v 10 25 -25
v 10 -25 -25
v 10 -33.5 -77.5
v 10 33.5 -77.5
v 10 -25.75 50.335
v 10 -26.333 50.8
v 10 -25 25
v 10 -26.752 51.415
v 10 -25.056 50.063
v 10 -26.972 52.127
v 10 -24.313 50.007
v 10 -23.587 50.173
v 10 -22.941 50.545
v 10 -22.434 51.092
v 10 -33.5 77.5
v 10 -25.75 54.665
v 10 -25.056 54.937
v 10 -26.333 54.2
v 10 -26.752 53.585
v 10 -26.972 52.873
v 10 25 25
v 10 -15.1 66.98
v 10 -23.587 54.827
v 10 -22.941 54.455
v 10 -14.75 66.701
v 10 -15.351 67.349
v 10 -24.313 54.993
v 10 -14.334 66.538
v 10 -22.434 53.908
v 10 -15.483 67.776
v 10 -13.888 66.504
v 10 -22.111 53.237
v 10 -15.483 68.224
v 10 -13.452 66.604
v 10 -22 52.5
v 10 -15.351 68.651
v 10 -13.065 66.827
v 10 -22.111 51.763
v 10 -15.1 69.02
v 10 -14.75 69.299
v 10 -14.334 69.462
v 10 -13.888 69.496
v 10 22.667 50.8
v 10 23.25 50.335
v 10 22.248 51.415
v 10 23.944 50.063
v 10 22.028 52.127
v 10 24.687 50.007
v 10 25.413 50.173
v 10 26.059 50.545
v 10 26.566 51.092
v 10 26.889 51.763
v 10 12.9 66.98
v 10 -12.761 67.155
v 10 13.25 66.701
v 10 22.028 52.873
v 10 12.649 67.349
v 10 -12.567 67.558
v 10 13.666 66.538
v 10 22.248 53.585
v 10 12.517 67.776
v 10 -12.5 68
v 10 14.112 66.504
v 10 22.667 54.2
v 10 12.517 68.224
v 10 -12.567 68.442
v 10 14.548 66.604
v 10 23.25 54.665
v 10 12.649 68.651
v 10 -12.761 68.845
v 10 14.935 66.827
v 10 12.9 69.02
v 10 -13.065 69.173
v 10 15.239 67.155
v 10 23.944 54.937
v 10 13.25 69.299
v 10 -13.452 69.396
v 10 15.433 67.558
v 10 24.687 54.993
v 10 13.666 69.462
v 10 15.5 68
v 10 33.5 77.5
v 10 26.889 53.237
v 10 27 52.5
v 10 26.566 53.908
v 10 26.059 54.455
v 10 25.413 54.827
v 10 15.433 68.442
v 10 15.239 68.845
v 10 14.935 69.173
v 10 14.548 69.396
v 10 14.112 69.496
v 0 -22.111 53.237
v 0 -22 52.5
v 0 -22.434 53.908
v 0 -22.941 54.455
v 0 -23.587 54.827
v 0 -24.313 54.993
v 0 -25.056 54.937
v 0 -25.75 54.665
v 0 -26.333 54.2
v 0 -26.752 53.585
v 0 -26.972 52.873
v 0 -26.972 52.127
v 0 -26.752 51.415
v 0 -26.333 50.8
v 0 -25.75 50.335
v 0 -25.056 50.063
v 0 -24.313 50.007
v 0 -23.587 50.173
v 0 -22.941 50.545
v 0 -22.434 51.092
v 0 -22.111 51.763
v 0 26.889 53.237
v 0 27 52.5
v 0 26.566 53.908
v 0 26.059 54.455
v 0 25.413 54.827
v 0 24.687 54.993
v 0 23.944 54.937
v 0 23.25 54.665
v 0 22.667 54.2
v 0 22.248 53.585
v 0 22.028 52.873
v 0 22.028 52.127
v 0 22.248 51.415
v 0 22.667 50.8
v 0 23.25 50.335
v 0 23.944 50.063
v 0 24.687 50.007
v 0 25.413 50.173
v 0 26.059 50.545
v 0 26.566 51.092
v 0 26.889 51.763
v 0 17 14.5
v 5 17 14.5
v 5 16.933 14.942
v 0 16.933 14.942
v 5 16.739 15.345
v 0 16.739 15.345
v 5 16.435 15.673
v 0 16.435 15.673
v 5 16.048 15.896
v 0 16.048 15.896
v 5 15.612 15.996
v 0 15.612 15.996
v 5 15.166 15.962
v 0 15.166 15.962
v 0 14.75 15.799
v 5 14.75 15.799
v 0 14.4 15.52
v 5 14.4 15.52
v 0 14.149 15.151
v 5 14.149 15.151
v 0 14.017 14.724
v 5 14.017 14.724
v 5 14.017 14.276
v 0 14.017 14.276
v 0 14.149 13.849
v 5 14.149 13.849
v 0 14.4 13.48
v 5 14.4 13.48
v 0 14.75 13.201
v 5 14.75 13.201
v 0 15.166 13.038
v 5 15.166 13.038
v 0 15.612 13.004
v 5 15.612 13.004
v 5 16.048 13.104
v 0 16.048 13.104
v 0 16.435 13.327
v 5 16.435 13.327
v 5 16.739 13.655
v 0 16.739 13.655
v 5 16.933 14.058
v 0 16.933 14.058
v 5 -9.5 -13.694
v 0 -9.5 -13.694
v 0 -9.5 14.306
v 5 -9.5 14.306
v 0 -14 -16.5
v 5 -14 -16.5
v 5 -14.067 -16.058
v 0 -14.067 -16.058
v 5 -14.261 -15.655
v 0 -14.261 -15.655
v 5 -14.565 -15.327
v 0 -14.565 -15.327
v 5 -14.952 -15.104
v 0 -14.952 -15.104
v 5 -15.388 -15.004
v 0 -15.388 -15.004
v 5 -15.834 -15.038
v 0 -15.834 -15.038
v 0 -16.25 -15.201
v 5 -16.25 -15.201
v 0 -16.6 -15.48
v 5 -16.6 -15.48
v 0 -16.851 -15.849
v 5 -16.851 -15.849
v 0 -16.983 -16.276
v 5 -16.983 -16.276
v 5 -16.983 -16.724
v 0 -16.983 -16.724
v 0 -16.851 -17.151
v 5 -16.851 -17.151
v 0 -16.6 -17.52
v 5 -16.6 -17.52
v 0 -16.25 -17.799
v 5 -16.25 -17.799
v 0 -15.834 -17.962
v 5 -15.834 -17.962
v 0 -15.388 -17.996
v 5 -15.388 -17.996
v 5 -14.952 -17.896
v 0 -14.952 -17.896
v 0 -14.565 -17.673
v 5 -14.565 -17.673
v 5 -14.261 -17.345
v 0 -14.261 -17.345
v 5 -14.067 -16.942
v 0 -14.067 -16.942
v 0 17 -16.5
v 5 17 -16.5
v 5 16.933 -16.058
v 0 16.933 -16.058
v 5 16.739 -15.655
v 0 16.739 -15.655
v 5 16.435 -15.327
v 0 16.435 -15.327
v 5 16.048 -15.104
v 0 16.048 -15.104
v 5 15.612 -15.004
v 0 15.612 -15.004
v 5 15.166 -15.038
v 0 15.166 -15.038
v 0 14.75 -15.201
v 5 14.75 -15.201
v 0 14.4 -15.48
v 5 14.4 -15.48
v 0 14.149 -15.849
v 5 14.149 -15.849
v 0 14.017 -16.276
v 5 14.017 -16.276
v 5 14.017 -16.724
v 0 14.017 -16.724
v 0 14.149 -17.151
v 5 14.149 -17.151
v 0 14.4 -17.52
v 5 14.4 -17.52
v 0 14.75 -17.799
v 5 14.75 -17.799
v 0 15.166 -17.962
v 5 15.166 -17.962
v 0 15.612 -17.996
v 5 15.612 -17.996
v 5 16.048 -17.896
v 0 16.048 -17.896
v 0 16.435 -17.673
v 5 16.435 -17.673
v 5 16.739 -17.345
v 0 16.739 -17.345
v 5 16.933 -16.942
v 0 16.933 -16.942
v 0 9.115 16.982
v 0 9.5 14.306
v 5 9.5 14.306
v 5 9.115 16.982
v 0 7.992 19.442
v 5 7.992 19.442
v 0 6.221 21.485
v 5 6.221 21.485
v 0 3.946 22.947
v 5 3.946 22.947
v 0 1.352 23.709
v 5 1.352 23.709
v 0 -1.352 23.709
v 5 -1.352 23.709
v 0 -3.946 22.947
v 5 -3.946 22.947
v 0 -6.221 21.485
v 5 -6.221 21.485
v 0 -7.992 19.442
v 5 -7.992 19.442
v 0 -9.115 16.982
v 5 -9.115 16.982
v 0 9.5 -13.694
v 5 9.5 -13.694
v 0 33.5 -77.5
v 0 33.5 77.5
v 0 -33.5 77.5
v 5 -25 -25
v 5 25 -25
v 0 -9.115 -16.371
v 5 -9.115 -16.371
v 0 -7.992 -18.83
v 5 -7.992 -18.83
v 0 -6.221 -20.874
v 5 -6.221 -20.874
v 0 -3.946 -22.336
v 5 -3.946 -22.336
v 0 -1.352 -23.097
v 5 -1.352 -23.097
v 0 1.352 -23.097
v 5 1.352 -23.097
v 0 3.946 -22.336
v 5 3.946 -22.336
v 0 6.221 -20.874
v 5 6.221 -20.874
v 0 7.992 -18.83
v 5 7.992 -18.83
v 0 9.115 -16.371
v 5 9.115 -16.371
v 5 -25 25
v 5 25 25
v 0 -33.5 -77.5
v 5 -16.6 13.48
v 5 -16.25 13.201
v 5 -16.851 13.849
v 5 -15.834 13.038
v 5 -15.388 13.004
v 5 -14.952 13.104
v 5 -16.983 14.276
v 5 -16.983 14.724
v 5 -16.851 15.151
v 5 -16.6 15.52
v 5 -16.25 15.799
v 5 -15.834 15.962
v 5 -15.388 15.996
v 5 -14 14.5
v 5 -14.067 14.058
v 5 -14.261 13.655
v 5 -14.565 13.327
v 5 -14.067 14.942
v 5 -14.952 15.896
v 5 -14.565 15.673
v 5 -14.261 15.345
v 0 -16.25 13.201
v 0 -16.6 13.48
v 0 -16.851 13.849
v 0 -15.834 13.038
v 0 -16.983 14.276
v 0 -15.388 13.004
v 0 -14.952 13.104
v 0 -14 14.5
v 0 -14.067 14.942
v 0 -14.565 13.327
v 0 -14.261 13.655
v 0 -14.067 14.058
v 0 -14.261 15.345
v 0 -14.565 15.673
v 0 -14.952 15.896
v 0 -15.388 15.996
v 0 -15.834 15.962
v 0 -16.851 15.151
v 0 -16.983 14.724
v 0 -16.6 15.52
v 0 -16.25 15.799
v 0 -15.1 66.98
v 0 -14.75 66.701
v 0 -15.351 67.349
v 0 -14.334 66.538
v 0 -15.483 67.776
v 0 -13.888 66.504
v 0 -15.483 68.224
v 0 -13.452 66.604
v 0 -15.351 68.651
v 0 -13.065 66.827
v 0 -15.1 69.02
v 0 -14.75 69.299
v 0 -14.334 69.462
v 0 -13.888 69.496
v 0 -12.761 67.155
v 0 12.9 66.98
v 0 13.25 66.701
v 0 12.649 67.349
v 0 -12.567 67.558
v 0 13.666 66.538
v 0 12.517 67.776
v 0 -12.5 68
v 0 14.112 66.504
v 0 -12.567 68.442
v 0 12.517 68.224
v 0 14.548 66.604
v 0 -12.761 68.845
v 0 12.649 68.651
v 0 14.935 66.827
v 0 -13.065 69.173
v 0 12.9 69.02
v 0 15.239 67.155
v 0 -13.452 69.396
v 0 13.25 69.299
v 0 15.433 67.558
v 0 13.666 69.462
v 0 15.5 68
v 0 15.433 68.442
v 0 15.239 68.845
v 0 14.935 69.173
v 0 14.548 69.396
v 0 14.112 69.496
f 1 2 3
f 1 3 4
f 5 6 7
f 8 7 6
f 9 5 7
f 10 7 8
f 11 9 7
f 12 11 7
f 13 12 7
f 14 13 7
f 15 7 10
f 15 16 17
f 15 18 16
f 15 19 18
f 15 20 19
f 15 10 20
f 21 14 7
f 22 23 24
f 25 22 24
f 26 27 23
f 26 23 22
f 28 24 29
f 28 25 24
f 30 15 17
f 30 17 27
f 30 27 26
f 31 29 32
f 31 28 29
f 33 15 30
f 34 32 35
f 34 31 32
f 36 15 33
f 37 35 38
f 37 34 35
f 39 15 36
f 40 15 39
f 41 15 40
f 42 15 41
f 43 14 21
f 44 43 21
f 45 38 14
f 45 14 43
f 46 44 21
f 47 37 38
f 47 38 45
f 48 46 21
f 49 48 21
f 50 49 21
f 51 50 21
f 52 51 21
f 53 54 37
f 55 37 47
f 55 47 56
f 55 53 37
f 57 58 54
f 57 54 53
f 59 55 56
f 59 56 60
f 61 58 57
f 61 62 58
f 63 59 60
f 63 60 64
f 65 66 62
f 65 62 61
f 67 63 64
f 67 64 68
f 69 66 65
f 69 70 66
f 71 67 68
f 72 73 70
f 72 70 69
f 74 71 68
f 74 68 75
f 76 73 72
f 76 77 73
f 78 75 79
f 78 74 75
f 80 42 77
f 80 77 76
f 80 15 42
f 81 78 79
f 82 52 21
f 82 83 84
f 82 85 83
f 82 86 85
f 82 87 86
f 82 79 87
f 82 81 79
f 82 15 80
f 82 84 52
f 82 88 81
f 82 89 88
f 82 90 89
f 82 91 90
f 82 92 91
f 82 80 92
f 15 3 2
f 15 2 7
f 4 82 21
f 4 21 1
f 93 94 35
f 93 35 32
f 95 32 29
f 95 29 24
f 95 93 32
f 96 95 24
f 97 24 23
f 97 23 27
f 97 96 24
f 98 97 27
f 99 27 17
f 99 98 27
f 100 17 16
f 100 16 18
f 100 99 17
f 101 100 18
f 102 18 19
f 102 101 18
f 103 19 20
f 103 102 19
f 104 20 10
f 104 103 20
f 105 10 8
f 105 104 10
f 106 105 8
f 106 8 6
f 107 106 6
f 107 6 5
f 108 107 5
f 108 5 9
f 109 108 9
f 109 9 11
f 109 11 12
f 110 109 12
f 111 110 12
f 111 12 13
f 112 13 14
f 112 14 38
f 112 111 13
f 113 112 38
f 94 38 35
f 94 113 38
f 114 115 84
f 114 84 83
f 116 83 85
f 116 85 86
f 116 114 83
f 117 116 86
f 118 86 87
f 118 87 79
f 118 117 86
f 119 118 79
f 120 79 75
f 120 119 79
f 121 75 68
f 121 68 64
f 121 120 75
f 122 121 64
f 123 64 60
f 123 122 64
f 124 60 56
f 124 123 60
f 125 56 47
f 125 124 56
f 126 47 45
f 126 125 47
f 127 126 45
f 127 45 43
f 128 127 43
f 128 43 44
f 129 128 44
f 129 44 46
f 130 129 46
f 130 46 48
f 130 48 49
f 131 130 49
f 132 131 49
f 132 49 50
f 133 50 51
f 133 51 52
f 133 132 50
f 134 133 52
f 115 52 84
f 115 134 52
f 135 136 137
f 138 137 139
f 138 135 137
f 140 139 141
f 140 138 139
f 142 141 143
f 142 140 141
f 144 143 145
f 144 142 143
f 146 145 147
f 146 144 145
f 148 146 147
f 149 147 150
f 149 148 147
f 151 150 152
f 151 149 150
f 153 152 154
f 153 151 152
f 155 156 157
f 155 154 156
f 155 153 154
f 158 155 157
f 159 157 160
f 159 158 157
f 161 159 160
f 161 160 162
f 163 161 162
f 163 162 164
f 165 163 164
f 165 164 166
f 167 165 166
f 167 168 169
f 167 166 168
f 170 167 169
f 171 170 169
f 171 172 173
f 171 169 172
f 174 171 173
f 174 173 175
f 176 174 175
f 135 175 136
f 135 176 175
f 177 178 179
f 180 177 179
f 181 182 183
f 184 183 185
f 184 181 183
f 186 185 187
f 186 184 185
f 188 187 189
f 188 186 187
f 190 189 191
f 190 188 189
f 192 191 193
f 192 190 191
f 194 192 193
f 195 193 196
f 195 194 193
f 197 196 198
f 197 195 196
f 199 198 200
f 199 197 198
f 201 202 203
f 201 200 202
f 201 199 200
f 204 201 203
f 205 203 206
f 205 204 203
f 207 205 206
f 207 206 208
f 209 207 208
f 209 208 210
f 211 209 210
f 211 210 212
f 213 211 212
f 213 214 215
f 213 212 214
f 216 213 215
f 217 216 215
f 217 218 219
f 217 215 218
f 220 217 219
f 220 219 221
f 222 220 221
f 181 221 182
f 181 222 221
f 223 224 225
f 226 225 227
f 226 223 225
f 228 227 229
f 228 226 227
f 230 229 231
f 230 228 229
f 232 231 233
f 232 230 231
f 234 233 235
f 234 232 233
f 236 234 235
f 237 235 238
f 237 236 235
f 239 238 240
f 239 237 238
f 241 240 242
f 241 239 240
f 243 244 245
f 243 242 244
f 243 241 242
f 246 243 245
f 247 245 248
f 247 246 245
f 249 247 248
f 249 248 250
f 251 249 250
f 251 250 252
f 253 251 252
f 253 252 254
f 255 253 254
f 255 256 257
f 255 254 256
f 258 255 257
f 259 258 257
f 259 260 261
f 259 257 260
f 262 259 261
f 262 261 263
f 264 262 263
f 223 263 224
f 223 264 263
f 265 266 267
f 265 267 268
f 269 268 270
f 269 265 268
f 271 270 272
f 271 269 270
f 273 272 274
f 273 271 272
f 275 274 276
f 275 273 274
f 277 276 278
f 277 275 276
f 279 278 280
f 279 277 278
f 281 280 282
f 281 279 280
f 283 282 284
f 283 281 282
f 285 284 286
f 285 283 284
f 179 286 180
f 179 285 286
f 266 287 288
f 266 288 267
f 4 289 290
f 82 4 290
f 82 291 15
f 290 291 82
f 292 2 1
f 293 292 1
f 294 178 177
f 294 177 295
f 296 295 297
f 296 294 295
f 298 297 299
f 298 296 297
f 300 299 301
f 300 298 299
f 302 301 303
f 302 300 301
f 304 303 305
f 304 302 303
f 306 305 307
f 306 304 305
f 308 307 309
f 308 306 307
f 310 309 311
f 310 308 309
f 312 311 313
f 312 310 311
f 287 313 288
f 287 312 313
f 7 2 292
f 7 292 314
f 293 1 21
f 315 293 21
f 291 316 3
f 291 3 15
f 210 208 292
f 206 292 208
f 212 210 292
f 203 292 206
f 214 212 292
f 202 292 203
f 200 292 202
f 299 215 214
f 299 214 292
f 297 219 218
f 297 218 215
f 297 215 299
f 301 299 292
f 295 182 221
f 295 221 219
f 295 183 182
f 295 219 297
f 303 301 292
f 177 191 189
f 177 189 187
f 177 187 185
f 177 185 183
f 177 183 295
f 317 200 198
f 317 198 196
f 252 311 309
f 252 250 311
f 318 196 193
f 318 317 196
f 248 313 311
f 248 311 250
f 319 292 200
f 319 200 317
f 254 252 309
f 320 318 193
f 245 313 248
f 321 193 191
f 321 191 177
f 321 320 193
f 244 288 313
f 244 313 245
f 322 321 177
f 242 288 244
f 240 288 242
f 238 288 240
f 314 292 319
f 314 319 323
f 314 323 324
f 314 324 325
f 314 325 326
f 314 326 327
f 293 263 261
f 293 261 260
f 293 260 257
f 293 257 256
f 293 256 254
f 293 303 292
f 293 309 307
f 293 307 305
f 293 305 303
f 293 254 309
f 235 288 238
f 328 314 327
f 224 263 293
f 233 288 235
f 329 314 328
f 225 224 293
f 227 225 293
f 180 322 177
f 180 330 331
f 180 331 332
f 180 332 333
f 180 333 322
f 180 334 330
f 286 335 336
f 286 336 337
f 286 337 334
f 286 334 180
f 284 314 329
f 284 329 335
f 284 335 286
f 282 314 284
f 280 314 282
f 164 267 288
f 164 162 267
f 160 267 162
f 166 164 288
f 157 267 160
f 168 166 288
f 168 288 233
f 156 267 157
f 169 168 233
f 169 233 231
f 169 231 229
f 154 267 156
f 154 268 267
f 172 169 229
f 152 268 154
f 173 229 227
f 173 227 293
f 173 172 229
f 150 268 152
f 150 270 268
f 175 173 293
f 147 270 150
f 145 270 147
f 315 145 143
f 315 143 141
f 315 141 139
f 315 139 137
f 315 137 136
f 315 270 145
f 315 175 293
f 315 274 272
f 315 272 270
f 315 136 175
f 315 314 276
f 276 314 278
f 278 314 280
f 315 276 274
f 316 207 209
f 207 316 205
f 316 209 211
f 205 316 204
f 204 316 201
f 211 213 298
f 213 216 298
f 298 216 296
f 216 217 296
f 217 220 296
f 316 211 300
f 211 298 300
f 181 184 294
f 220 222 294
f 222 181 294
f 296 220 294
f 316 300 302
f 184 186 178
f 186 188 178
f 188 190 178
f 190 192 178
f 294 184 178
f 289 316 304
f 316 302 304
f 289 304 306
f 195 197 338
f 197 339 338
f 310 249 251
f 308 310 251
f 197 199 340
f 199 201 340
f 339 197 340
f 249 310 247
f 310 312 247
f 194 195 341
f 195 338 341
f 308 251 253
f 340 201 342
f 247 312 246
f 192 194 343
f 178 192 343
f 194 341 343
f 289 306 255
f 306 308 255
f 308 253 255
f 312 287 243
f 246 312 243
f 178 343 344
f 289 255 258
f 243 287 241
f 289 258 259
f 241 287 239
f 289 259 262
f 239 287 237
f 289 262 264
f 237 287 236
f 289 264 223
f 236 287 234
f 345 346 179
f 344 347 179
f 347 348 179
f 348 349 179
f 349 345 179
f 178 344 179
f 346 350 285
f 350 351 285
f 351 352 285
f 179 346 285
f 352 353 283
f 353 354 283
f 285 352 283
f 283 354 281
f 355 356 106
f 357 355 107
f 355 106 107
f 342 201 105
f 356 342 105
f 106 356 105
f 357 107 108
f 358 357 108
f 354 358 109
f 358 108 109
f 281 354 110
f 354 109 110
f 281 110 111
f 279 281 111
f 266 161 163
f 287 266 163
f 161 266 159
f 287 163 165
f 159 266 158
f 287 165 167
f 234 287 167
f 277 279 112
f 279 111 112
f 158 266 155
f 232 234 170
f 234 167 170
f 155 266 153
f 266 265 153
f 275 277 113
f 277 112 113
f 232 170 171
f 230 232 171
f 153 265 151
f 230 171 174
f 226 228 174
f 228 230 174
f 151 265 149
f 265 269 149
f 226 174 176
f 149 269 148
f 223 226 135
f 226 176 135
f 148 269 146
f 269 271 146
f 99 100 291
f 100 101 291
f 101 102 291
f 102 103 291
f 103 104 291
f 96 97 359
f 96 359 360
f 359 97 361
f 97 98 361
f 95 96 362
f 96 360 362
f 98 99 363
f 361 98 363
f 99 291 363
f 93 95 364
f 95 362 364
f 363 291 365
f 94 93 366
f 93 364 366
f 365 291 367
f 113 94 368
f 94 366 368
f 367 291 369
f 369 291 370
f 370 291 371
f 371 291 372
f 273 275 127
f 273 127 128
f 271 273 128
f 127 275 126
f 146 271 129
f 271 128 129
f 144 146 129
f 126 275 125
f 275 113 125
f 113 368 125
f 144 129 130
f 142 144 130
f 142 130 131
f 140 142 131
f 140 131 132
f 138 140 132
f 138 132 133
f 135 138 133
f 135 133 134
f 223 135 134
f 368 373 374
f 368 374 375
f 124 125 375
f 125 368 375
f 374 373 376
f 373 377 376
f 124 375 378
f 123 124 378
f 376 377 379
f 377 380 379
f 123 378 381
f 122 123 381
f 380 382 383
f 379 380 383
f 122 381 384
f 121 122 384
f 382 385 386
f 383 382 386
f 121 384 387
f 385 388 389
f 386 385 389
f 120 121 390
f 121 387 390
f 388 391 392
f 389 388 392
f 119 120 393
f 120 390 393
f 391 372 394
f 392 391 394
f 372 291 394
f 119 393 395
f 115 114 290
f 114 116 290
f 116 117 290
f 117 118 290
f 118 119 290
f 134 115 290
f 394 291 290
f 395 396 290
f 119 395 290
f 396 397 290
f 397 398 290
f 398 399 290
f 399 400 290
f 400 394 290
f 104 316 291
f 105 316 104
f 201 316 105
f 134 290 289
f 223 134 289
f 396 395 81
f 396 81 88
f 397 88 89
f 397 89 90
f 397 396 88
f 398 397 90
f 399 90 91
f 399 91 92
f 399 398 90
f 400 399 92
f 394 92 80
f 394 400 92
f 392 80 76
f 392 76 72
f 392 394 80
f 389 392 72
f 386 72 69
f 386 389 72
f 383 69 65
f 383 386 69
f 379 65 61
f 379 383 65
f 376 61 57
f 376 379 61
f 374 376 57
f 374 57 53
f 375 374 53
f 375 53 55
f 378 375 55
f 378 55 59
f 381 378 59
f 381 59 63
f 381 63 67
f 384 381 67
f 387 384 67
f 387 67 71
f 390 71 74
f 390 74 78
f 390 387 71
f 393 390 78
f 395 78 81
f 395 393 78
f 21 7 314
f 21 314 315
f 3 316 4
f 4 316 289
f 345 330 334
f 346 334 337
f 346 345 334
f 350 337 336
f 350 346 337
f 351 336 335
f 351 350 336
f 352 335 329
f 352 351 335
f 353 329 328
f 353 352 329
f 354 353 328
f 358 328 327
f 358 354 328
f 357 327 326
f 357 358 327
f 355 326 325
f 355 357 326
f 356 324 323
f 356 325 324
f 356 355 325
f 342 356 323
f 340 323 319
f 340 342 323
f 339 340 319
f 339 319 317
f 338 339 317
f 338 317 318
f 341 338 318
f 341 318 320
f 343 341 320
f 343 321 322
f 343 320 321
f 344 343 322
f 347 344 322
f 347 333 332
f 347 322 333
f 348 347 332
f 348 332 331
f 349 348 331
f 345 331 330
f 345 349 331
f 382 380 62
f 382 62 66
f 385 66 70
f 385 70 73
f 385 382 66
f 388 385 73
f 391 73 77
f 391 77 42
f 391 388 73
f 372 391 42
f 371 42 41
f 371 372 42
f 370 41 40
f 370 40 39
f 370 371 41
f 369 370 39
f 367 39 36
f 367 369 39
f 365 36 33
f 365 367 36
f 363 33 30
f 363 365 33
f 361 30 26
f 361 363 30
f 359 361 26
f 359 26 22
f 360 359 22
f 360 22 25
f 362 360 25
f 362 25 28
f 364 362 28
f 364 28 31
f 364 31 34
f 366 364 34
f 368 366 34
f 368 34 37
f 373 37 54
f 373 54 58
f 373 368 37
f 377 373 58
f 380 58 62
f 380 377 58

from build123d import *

# Parameters (mm, degrees)
SKETCH_W     = 67
SKETCH_H     = 155
SKETCH_R     = 1.5
SKETCH_R_2   = 2.5
PAD_DEPTH    = 10
SKETCH001_W  = 50
SKETCH001_H  = 50
POCKET_DEPTH = 5


with BuildPart() as part:
    # Sketch → Pad (new body)
    with BuildSketch(Plane.YZ):
        Rectangle(SKETCH_W, SKETCH_H)
        with Locations((-15.5, 14.5)):
            Circle(SKETCH_R, mode=Mode.SUBTRACT)
        with Locations((15.5, 14.5)):
            Circle(SKETCH_R, mode=Mode.SUBTRACT)
        with Locations((15.5, -16.5)):
            Circle(SKETCH_R, mode=Mode.SUBTRACT)
        with Locations((-15.5, -16.5)):
            Circle(SKETCH_R, mode=Mode.SUBTRACT)
        with Locations((24.5, 52.5)):
            Circle(SKETCH_R_2, mode=Mode.SUBTRACT)
        with Locations((-24.5, 52.5)):
            Circle(SKETCH_R_2, mode=Mode.SUBTRACT)
        with Locations((14, 68)):
            Circle(SKETCH_R, mode=Mode.SUBTRACT)
        with Locations((-14, 68)):
            Circle(SKETCH_R, mode=Mode.SUBTRACT)
        with BuildLine():
            ThreePointArc((-9.5, -13.694169), (0, -23.194169), (9.5, -13.694169))
            Line((9.5, -13.694169), (9.5, 14.305831))
            ThreePointArc((9.5, 14.305831), (0, 23.805831), (-9.5, 14.305831))
            Line((-9.5, -13.694169), (-9.5, 14.305831))
        make_face(mode=Mode.SUBTRACT)
    extrude(amount=PAD_DEPTH)

    # Sketch001 (on Face18 of Pad) → Pocket (cut)
    with BuildSketch(Plane.YZ.offset(10)):
        Rectangle(SKETCH001_W, SKETCH001_H)
    extrude(amount=-POCKET_DEPTH, mode=Mode.SUBTRACT)


solid = part.part
